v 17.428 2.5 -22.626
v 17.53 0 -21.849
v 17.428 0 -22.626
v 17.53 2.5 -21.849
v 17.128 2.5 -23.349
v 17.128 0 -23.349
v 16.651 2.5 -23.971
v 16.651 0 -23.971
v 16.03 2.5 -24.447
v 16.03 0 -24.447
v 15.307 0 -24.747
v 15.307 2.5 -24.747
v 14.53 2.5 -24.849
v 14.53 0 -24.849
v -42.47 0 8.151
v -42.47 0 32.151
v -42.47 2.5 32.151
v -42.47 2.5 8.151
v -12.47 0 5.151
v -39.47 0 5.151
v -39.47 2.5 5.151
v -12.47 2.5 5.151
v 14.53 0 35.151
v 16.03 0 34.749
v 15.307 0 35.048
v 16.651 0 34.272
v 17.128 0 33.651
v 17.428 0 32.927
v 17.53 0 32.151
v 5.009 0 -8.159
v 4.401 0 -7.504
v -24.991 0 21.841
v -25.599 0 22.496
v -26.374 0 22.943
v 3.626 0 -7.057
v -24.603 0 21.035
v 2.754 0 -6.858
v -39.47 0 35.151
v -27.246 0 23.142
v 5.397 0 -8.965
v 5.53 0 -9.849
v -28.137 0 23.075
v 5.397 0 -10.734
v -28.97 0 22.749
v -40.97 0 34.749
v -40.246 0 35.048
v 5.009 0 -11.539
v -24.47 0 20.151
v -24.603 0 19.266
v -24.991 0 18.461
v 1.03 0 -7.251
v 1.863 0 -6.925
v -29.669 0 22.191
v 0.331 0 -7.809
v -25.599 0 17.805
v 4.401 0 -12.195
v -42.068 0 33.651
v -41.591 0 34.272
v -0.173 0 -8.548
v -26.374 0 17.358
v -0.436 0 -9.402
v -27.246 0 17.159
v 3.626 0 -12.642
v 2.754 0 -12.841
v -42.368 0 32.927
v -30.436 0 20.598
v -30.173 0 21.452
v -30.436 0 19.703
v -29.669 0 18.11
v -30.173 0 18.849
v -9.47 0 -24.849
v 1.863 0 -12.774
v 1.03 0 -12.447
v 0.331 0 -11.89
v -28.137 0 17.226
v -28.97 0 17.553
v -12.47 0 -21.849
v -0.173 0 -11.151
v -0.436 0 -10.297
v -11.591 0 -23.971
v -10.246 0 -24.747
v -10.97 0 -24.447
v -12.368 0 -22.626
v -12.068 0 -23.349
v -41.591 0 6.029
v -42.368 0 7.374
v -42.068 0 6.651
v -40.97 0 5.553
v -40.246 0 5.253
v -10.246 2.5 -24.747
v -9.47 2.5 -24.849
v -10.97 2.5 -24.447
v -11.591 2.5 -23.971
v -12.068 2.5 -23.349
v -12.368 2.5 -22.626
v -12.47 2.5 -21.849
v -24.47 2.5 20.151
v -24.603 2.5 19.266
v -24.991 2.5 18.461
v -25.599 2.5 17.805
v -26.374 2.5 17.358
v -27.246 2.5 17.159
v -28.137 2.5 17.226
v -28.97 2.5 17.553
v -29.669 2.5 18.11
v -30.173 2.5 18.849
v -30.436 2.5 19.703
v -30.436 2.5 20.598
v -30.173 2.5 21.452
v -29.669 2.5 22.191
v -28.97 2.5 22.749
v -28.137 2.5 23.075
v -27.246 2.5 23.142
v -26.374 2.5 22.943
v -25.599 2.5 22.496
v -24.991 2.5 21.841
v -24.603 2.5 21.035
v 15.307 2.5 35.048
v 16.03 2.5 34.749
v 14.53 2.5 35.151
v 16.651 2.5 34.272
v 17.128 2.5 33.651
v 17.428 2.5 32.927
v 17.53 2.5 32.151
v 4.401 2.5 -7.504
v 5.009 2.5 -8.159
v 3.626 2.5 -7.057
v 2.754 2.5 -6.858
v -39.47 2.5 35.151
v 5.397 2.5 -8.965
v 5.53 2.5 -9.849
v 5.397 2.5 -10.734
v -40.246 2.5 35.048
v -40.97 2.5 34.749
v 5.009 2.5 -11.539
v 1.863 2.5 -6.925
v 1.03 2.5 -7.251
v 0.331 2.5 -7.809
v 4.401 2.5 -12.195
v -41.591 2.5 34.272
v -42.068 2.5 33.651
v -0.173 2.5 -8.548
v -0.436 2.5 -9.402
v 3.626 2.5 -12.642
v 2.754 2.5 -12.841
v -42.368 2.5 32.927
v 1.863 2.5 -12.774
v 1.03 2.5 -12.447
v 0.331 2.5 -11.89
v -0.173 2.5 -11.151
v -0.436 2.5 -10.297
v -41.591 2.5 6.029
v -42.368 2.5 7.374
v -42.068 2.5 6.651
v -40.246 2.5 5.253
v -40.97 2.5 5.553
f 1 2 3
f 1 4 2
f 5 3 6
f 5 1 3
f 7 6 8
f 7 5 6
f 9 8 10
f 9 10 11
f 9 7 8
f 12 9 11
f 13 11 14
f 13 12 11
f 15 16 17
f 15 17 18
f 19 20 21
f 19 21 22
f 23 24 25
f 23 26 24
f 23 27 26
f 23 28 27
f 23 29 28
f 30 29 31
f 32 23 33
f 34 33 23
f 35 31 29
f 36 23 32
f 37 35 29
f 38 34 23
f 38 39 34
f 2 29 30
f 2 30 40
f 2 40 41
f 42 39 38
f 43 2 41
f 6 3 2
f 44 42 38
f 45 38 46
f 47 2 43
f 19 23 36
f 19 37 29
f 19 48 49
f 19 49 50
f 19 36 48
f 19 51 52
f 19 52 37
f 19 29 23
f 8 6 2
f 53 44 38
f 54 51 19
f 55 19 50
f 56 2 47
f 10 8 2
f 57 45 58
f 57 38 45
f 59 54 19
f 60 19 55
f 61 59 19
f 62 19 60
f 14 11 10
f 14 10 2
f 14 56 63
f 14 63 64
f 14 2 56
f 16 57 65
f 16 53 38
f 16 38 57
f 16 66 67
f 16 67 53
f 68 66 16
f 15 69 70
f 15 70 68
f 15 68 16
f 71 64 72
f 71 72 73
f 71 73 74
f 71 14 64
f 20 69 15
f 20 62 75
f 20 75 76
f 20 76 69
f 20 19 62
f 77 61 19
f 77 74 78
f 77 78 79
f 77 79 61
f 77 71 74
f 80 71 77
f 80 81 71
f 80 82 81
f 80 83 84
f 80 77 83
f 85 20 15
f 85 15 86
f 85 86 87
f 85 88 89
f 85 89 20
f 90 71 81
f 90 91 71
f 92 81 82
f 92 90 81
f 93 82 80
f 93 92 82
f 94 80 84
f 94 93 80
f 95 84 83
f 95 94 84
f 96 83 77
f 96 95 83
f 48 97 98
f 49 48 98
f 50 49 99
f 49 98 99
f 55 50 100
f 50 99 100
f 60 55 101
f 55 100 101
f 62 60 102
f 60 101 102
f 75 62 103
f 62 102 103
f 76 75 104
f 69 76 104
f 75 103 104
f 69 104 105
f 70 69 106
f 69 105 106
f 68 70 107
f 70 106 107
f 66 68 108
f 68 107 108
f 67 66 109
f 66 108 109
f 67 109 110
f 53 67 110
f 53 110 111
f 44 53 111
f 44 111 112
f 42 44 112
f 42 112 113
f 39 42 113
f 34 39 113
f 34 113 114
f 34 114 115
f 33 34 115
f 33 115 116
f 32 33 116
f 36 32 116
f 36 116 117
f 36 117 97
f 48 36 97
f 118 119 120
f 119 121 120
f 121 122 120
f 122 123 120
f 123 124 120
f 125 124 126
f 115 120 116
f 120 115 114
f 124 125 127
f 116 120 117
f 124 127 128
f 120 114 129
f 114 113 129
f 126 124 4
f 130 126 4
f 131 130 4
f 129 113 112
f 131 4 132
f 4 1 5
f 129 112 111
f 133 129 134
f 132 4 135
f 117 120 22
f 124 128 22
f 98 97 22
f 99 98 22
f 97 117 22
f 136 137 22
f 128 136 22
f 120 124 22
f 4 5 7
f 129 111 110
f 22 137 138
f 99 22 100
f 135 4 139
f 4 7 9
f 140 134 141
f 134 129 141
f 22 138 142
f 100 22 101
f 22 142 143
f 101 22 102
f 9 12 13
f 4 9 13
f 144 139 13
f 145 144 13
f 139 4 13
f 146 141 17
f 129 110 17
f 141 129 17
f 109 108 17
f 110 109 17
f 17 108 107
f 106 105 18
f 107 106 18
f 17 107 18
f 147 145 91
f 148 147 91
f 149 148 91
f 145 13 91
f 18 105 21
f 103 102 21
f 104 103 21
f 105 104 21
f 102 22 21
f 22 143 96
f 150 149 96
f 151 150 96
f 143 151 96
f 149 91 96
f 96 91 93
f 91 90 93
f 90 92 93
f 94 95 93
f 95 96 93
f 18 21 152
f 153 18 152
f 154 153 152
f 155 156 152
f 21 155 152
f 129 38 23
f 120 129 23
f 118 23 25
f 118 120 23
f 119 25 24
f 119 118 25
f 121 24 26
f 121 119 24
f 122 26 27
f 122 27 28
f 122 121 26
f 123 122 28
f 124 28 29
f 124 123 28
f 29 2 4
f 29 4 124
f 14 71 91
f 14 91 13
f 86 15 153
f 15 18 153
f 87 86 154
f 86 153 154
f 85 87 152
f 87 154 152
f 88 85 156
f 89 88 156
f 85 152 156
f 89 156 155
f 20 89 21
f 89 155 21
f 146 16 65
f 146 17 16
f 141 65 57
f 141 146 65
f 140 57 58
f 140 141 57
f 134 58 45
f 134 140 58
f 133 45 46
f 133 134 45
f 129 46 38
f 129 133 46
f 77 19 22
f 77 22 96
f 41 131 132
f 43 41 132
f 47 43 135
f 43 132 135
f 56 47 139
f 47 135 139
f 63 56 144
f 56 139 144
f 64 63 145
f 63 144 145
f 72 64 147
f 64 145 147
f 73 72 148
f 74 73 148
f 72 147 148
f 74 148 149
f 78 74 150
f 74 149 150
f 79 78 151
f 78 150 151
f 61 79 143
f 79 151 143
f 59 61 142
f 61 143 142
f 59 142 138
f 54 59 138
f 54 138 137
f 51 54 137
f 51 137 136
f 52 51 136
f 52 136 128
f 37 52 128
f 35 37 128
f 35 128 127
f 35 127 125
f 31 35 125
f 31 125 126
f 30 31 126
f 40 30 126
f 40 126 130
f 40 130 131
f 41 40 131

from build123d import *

# Parameters (mm, degrees)
BOSS_EXTRUDE1_DEPTH = 2.5
FILLET1_R           = 3
FILLET2_R           = 3
FILLET3_R           = 3
FILLET4_R           = 3
FILLET5_R           = 3
SKETCH2_R           = 3
CUT_EXTRUDE1_DEPTH  = 3


with BuildPart() as part:
    # Sketch1 → Boss-Extrude1 (new body)
    with BuildSketch(Plane(origin=(0, 0, 0), x_dir=(1, 0, 0), z_dir=(0, 1, 0))):
        Polygon((-12.469879518, 24.84939759), (17.530120482, 24.84939759), (17.530120482, -35.15060241), (-12.469879518, -35.15060241), (-42.469879518, -35.15060241), (-42.469879518, -5.15060241), (-12.469879518, -5.15060241), align=None)
    extrude(amount=BOSS_EXTRUDE1_DEPTH)

    # Fillet1
    fillet1_edges = [part.edges().sort_by_distance(p)[0] for p in [
        (-42.469879518, 1.25, 5.15060241),
    ]]
    fillet(fillet1_edges, radius=FILLET1_R)

    # Fillet2
    fillet2_edges = [part.edges().sort_by_distance(p)[0] for p in [
        (-42.469879518, 1.25, 35.15060241),
    ]]
    fillet(fillet2_edges, radius=FILLET2_R)

    # Fillet3
    fillet3_edges = [part.edges().sort_by_distance(p)[0] for p in [
        (17.530120482, 1.25, 35.15060241),
    ]]
    fillet(fillet3_edges, radius=FILLET3_R)

    # Fillet4
    fillet4_edges = [part.edges().sort_by_distance(p)[0] for p in [
        (17.530120482, 1.25, -24.84939759),
    ]]
    fillet(fillet4_edges, radius=FILLET4_R)

    # Fillet5
    fillet5_edges = [part.edges().sort_by_distance(p)[0] for p in [
        (-12.469879518, 1.25, -24.84939759),
    ]]
    fillet(fillet5_edges, radius=FILLET5_R)

    # Sketch2 → Cut-Extrude1 (cut)
    with BuildSketch(Plane(origin=(0, 2.5, 0), x_dir=(1, 0, 0), z_dir=(0, 1, 0))):
        with Locations((2.530120482, 9.84939759)):
            Circle(SKETCH2_R)
        with Locations((-27.469879518, -20.15060241)):
            Circle(SKETCH2_R)
    extrude(amount=-CUT_EXTRUDE1_DEPTH, mode=Mode.SUBTRACT)


solid = part.part
